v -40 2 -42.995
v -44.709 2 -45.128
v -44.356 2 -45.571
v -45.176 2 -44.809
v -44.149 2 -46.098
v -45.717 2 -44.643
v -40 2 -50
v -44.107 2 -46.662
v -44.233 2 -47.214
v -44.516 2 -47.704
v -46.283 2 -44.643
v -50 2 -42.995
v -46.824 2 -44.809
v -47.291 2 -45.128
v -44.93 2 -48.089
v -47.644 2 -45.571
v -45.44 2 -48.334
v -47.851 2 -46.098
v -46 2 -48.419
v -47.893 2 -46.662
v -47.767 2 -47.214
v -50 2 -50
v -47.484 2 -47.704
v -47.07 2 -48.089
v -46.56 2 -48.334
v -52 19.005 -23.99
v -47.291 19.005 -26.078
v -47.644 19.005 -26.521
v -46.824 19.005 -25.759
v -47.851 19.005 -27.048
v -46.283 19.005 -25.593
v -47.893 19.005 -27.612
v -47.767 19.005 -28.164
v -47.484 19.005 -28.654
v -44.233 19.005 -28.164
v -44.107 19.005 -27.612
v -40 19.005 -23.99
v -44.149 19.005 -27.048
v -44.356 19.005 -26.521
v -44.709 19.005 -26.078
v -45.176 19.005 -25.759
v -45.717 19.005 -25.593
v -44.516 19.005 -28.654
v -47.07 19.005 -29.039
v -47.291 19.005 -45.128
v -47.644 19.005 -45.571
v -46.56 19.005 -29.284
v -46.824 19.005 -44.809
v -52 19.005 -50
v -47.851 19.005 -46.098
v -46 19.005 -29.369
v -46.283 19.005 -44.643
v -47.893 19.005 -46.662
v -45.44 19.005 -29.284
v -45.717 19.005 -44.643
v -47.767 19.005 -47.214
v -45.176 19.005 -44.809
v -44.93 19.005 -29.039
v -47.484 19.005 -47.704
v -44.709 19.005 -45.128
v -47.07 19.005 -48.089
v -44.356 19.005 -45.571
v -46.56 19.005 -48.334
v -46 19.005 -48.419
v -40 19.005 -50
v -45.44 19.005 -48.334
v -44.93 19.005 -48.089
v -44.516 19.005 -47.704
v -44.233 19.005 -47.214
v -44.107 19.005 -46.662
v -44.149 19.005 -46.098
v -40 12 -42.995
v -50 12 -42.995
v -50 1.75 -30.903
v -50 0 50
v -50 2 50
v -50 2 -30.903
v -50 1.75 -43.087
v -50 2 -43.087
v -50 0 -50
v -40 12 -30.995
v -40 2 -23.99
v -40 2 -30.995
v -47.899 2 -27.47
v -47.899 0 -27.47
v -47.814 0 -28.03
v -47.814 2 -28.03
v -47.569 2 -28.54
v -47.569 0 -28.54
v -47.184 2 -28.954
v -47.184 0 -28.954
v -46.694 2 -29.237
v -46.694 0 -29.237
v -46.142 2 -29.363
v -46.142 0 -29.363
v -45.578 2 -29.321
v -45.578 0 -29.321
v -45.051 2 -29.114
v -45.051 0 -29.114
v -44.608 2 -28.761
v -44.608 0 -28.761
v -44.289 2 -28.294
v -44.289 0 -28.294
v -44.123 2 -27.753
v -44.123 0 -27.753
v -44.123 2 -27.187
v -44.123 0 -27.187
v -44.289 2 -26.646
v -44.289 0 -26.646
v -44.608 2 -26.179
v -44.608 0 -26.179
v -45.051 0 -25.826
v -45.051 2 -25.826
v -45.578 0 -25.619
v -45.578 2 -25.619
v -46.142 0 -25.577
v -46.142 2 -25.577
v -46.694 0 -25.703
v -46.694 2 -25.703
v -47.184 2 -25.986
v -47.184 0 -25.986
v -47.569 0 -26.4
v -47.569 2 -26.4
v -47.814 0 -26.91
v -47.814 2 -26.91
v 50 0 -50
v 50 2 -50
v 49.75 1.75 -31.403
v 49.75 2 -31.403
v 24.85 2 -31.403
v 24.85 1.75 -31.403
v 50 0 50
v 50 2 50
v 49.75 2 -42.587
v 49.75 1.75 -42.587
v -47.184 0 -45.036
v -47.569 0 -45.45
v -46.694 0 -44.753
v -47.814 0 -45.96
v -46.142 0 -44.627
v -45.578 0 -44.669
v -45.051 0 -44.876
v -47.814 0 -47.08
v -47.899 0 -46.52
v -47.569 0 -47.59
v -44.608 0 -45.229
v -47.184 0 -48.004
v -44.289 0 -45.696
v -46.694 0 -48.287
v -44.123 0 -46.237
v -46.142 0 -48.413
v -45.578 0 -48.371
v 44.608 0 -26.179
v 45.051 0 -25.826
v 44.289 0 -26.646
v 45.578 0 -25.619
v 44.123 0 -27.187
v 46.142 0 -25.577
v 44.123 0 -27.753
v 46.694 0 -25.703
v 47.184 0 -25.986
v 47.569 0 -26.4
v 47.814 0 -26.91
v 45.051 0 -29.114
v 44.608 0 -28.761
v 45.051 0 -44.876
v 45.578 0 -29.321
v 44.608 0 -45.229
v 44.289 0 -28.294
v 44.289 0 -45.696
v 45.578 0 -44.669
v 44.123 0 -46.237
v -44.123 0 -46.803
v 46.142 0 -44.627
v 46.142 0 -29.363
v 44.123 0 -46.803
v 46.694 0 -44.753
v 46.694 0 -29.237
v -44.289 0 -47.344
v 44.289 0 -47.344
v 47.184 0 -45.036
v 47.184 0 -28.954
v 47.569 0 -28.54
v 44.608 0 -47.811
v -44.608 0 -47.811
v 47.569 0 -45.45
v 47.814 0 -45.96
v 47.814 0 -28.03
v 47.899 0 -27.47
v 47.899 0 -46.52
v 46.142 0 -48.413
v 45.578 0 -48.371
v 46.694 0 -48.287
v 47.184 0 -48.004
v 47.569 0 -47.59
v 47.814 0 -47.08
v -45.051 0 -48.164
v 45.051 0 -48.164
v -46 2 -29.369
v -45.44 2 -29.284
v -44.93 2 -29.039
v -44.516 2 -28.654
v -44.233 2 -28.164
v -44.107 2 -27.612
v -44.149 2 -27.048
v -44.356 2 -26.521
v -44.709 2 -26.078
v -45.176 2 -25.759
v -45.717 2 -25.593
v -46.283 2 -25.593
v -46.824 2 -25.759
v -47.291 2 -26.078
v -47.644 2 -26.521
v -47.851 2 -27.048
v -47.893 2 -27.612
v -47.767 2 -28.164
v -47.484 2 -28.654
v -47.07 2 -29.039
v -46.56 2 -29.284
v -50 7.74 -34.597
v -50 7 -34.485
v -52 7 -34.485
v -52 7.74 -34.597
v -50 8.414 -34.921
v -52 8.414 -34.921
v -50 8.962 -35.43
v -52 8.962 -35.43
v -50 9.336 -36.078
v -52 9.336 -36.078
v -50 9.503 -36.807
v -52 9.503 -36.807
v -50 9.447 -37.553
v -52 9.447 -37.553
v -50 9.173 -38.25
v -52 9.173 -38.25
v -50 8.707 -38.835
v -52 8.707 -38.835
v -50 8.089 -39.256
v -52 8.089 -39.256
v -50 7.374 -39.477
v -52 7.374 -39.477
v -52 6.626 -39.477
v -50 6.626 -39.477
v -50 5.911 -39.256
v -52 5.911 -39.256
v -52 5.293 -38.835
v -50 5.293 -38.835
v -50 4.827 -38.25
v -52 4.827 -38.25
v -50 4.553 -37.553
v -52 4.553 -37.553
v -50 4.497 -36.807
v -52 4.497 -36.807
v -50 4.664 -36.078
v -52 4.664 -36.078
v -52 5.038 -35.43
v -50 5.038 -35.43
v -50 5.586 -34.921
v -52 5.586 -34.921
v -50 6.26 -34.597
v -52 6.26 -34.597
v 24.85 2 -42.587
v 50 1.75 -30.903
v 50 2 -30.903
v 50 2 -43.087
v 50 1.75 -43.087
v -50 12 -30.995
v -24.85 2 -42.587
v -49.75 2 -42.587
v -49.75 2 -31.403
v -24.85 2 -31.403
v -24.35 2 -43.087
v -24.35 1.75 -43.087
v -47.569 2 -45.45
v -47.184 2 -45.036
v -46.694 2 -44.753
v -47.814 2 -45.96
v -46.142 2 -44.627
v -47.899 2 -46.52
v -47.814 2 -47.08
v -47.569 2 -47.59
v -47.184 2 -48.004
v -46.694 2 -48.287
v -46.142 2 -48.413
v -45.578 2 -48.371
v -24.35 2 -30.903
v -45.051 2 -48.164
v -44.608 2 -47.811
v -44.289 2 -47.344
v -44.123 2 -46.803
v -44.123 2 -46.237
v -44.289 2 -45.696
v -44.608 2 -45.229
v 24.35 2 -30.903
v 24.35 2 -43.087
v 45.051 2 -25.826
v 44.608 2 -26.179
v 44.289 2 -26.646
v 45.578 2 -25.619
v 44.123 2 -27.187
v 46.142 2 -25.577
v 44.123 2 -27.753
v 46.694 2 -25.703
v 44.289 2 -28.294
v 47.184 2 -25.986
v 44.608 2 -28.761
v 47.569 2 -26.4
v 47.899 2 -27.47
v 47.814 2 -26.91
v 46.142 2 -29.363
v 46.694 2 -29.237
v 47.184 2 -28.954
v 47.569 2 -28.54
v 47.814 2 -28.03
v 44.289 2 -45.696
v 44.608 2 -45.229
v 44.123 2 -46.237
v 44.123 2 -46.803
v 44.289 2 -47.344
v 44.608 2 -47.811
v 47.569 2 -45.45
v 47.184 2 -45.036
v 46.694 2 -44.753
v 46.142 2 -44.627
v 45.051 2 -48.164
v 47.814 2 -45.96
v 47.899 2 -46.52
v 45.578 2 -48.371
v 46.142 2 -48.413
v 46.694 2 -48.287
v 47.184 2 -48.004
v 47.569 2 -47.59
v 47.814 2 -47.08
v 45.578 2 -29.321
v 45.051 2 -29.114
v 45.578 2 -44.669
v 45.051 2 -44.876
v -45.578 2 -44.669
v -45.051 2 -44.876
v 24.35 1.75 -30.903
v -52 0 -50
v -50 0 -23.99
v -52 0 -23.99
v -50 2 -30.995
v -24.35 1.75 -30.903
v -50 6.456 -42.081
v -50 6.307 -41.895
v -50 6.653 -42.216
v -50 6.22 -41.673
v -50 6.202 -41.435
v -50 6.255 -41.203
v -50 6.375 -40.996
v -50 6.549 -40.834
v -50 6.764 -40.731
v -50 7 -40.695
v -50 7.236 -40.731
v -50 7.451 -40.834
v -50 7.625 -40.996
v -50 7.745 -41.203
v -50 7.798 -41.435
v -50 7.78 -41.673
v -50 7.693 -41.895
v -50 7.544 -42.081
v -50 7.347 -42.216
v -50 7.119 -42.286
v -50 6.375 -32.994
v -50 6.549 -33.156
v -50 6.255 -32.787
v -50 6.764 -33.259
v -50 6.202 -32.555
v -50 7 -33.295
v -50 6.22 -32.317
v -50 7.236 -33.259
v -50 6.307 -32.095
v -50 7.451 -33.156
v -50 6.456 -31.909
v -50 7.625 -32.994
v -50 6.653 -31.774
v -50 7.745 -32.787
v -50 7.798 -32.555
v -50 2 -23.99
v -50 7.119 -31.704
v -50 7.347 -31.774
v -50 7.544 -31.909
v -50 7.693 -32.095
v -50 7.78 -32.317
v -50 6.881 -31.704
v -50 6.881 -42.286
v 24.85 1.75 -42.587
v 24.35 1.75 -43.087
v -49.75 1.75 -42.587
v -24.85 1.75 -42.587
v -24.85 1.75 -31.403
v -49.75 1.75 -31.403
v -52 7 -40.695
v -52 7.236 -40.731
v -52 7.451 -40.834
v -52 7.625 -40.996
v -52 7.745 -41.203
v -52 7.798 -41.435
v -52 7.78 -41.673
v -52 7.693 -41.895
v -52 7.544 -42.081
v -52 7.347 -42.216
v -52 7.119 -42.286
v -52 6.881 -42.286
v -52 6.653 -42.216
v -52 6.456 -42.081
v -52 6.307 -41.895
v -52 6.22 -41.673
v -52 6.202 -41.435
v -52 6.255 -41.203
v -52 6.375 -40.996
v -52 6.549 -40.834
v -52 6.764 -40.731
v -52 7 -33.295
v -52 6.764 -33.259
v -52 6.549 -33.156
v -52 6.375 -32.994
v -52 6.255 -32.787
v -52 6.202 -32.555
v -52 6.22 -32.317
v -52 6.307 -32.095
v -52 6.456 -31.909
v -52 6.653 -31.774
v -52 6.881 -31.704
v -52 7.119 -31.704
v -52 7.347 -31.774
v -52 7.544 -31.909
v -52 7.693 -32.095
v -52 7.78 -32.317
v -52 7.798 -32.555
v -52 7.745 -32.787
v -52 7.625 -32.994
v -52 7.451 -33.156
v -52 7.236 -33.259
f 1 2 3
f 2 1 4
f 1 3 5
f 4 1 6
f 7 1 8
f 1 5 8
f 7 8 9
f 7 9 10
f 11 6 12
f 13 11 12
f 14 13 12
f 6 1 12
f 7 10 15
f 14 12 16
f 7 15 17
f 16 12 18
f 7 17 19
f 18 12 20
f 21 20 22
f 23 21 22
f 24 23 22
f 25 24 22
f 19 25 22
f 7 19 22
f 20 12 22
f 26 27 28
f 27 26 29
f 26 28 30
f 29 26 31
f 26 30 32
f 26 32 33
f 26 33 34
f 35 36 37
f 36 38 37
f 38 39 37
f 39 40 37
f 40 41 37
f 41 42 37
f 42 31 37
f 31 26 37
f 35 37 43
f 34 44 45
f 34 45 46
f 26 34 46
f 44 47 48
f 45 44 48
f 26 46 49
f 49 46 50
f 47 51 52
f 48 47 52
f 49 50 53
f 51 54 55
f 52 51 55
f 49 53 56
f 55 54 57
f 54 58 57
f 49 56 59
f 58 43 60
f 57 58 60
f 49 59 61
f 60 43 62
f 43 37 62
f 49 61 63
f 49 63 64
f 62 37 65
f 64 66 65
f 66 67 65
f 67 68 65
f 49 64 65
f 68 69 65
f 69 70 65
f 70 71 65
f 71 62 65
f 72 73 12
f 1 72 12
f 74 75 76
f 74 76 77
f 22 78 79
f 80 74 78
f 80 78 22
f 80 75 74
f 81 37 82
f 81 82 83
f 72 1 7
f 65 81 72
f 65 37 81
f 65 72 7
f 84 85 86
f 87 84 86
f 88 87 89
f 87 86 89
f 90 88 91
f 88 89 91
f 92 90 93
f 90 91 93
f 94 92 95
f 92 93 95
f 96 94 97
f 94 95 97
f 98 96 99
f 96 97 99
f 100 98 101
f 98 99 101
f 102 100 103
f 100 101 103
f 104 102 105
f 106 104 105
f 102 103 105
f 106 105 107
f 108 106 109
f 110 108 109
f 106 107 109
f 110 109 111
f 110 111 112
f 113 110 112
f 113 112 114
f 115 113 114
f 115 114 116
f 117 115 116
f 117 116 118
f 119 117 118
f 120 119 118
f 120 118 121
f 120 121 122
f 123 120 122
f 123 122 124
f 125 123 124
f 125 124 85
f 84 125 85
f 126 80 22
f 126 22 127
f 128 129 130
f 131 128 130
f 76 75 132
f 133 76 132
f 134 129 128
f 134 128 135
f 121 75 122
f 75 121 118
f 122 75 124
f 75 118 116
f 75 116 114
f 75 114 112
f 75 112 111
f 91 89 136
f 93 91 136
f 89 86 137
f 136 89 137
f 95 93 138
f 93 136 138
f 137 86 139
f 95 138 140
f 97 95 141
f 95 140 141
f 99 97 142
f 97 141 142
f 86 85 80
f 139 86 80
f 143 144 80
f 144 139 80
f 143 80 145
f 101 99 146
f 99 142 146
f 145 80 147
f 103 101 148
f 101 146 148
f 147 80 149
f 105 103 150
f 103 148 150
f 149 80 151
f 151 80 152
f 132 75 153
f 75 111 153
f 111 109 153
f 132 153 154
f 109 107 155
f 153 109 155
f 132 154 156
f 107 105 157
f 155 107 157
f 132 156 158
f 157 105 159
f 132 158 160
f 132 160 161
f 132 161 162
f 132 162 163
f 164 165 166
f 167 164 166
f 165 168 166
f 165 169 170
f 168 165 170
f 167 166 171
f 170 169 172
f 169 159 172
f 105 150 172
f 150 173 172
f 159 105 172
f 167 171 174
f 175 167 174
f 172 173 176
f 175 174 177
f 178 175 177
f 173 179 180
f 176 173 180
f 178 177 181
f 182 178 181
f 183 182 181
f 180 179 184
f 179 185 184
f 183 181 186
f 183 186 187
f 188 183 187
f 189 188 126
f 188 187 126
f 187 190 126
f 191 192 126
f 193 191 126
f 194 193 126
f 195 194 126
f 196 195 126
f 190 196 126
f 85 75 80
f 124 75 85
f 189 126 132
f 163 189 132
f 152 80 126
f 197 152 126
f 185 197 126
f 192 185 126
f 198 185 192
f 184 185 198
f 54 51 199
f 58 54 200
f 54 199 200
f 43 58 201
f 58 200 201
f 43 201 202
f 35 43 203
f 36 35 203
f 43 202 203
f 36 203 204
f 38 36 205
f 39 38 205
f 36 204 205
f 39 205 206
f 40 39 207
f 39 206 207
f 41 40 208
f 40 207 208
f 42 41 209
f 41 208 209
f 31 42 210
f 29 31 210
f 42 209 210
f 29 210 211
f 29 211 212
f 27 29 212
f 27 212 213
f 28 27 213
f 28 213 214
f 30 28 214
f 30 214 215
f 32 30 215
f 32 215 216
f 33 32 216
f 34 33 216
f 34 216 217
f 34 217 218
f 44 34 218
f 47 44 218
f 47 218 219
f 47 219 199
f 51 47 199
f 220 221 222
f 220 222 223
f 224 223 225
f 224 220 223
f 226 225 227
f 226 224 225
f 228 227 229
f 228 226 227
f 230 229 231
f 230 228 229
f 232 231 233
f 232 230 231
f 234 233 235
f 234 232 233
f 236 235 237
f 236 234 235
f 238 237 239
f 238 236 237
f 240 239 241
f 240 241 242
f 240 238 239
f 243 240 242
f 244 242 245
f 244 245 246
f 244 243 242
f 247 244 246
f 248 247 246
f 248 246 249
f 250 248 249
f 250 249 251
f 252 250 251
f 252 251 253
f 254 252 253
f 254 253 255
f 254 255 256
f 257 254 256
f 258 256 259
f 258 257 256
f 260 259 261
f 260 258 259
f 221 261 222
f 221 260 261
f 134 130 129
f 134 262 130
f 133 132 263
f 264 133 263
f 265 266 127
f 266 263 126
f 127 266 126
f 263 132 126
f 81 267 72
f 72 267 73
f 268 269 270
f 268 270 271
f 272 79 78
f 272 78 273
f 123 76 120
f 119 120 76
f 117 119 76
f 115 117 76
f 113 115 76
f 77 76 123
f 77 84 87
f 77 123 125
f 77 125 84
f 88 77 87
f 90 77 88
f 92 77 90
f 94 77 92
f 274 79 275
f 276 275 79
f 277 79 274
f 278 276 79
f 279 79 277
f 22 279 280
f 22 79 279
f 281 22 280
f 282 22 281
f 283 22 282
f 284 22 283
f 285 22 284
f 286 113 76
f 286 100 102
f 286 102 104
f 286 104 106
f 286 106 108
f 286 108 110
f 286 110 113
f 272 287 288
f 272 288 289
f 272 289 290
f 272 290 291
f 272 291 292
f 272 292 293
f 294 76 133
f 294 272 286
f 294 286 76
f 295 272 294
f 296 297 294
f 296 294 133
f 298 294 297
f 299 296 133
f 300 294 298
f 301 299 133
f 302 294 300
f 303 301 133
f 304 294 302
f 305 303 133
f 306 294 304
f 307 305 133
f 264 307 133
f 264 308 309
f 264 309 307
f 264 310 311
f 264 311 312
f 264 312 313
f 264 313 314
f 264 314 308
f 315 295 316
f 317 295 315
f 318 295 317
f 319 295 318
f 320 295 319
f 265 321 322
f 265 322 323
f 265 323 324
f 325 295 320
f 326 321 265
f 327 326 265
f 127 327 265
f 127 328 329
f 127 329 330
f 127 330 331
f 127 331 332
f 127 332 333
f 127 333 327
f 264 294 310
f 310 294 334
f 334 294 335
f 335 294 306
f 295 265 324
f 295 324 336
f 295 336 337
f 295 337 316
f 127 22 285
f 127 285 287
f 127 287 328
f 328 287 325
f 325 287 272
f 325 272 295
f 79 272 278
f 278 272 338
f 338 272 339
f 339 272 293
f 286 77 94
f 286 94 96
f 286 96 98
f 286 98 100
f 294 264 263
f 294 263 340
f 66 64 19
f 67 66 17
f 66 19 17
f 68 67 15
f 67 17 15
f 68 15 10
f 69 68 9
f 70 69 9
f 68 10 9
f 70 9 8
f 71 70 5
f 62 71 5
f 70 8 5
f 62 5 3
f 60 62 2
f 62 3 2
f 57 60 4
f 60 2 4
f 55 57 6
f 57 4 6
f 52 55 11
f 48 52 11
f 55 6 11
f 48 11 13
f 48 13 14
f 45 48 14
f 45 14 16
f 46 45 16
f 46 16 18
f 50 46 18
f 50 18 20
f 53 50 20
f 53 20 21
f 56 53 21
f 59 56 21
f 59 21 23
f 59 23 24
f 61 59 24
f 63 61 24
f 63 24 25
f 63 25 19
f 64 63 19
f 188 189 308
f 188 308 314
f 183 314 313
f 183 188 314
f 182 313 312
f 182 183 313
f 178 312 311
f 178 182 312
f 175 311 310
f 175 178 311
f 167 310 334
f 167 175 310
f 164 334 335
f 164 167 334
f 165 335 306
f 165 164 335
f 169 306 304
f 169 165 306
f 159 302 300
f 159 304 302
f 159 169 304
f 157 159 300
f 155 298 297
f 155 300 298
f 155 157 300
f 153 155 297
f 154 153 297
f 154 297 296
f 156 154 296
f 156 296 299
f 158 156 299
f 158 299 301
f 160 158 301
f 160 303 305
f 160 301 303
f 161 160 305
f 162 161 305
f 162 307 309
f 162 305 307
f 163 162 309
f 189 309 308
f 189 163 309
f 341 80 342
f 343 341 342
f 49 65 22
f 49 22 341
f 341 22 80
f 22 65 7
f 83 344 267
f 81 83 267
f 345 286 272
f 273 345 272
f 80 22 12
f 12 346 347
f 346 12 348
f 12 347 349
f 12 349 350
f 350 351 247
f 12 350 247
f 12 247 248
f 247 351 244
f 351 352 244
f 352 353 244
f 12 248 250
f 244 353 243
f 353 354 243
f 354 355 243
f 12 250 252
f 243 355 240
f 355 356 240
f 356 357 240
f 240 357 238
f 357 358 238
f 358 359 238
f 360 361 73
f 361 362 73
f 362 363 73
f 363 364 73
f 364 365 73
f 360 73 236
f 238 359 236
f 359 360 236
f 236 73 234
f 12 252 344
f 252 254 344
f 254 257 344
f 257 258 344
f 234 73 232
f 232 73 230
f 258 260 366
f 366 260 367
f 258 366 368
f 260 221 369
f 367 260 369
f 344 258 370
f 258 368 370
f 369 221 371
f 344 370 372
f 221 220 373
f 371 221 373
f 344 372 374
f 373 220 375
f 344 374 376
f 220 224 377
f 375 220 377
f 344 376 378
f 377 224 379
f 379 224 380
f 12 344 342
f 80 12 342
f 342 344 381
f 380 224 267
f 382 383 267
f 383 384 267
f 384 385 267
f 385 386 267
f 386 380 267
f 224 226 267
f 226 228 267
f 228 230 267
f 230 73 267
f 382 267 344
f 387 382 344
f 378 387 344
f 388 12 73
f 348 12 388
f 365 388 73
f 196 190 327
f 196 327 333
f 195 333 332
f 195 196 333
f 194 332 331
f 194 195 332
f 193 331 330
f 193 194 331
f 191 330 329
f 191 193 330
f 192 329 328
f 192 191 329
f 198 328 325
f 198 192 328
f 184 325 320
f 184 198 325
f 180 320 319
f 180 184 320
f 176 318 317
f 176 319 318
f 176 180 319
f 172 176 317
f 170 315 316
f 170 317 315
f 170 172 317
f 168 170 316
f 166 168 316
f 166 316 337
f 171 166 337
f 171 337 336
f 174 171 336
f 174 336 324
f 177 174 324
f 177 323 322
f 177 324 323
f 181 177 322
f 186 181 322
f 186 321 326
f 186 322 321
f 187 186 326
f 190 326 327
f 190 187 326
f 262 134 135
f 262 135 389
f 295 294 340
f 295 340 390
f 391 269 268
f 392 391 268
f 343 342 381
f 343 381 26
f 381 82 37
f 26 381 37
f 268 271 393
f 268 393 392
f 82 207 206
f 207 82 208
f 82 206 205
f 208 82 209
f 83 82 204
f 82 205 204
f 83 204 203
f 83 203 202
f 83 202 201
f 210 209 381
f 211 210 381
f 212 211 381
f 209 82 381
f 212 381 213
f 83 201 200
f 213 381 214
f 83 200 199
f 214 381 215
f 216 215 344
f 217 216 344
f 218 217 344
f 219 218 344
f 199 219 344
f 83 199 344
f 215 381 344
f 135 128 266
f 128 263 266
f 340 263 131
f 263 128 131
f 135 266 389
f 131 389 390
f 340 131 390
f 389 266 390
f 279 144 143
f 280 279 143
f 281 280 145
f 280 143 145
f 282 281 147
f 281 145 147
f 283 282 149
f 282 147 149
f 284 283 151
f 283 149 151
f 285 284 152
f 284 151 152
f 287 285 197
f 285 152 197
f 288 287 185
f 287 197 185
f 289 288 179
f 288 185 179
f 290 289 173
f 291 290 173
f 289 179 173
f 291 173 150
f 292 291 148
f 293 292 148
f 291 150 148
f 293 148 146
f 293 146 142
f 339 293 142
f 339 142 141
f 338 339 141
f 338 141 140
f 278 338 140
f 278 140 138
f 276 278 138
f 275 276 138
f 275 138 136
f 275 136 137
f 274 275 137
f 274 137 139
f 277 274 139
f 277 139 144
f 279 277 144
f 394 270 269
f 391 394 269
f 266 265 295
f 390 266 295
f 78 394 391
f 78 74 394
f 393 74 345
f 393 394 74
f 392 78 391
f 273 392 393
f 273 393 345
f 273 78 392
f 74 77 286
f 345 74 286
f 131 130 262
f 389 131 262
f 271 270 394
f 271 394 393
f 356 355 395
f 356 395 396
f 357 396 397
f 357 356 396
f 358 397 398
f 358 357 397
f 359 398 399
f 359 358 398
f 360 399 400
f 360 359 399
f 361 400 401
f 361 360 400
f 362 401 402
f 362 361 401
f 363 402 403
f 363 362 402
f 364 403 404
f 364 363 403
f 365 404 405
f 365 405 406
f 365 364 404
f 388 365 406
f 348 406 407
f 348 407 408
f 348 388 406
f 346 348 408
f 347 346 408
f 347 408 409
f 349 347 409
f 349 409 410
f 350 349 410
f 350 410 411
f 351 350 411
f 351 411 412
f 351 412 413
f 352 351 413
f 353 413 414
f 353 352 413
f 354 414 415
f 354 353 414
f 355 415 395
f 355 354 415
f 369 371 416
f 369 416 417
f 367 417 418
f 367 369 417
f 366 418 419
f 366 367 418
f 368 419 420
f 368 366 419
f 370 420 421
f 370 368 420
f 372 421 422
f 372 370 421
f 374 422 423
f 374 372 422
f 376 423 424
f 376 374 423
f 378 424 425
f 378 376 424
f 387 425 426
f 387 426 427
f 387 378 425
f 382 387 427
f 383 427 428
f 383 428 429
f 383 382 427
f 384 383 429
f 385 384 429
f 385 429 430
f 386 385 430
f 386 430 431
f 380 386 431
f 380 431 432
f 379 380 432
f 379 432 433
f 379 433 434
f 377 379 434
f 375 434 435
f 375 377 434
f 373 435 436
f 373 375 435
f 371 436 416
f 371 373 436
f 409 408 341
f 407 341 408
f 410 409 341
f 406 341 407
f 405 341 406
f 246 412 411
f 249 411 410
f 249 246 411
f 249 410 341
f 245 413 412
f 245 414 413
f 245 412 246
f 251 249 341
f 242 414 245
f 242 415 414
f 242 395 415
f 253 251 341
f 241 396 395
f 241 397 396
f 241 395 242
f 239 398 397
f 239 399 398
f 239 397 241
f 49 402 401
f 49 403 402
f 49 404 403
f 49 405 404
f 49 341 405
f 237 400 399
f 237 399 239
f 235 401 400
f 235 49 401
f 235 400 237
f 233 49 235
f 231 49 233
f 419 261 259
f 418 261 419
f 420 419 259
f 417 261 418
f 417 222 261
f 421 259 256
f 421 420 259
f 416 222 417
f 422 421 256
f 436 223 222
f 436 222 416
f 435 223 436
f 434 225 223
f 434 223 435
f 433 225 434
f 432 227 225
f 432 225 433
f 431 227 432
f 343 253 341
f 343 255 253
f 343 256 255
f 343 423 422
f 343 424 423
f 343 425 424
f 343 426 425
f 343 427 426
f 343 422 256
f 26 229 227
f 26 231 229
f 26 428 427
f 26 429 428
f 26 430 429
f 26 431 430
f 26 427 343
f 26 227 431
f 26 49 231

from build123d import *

# Parameters (mm, degrees)
SKETCH1_W             = 100
SKETCH1_H             = 100
BOSS_EXTRUDE1_DEPTH   = 2
F_6_CLEARANCE_HOLE1_D = 3.7973
SKETCH5_W             = 25.9
SKETCH5_H             = 12.184
SKETCH5_W_2           = 24.9
SKETCH5_H_2           = 11.184
CUT_EXTRUDE1_DEPTH    = 0.25
BOSS_EXTRUDE2_DEPTH   = 10
SKETCH9_R             = 1.89865
CUT_EXTRUDE2_DEPTH    = 73.726680283
SKETCH12_R            = 0.8
SKETCH12_R_2          = 2.509681558
BOSS_EXTRUDE3_DEPTH   = 2


with BuildPart() as part:
    # Sketch1 → Boss-Extrude1 (new body)
    with BuildSketch(Plane(origin=(0, 0, 0), x_dir=(1, 0, 0), z_dir=(0, 1, 0))):
        Rectangle(SKETCH1_W, SKETCH1_H)
    extrude(amount=BOSS_EXTRUDE1_DEPTH)

    # #6 Clearance Hole1 (through all)
    with Locations(Plane(origin=(0, 2, 0), x_dir=(1, 0, 0), z_dir=(0, 1, 0))):
        with Locations((-46, 27.47), (-46, 46.52)):
            f_6_clearance_hole1 = Hole(F_6_CLEARANCE_HOLE1_D / 2)

    # Sketch5 → Cut-Extrude1 (cut)
    with BuildSketch(Plane(origin=(0, 2, 0), x_dir=(1, 0, 0), z_dir=(0, 1, 0))):
        with Locations((-37.3, 36.995)):
            Rectangle(SKETCH5_W, SKETCH5_H)
        with Locations((-37.3, 36.995)):
            Rectangle(SKETCH5_W_2, SKETCH5_H_2, mode=Mode.SUBTRACT)
    cut_extrude1 = extrude(amount=-CUT_EXTRUDE1_DEPTH, mode=Mode.SUBTRACT)

    # Mirror1: #6 Clearance Hole1, Cut-Extrude1 across plane
    add(f_6_clearance_hole1.mirror(Plane(origin=(0, 0, 0), x_dir=(0, 0, 1), z_dir=(1, 0, 0))), mode=Mode.SUBTRACT)
    add(cut_extrude1.mirror(Plane(origin=(0, 0, 0), x_dir=(0, 0, 1), z_dir=(1, 0, 0))), mode=Mode.SUBTRACT)


with BuildPart() as body_2:
    # Sketch6 → Boss-Extrude2 (new body)
    with BuildSketch(Plane.ZY.offset(50)):
        Polygon((-30.995, 12), (-42.995, 12), (-42.995, 2), (-50, 2), (-50, 19.005), (-23.99, 19.005), (-23.99, 2), (-30.995, 2), align=None)
    extrude(amount=-BOSS_EXTRUDE2_DEPTH)

    # Sketch9 → Cut-Extrude2 (cut, through all)
    with BuildSketch(Plane.XZ.offset(-2)):
        with Locations(Location((-46, -27.47, 0), (0, 0, 270))):
            Circle(SKETCH9_R)
        with Locations(Location((-46, -46.52, 0), (0, 0, 270))):
            Circle(SKETCH9_R)
    extrude(amount=-CUT_EXTRUDE2_DEPTH, mode=Mode.SUBTRACT)

    # Sketch12 → Boss-Extrude3 (add)
    with BuildSketch(Plane.ZY.offset(50)):
        Polygon((-23.99, 2), (-23.99, 19.005), (-50, 19.005), (-50, 2), (-50, 0), (-23.99, 0), align=None)
        with Locations((-41.495, 7)):
            Circle(SKETCH12_R, mode=Mode.SUBTRACT)
        with Locations(Location((-32.495, 7, 0), (0, 0, 180))):
            Circle(SKETCH12_R, mode=Mode.SUBTRACT)
        with Locations((-36.995, 7)):
            Circle(SKETCH12_R_2, mode=Mode.SUBTRACT)
    extrude(amount=BOSS_EXTRUDE3_DEPTH)


solid = Compound([part.part, body_2.part])
